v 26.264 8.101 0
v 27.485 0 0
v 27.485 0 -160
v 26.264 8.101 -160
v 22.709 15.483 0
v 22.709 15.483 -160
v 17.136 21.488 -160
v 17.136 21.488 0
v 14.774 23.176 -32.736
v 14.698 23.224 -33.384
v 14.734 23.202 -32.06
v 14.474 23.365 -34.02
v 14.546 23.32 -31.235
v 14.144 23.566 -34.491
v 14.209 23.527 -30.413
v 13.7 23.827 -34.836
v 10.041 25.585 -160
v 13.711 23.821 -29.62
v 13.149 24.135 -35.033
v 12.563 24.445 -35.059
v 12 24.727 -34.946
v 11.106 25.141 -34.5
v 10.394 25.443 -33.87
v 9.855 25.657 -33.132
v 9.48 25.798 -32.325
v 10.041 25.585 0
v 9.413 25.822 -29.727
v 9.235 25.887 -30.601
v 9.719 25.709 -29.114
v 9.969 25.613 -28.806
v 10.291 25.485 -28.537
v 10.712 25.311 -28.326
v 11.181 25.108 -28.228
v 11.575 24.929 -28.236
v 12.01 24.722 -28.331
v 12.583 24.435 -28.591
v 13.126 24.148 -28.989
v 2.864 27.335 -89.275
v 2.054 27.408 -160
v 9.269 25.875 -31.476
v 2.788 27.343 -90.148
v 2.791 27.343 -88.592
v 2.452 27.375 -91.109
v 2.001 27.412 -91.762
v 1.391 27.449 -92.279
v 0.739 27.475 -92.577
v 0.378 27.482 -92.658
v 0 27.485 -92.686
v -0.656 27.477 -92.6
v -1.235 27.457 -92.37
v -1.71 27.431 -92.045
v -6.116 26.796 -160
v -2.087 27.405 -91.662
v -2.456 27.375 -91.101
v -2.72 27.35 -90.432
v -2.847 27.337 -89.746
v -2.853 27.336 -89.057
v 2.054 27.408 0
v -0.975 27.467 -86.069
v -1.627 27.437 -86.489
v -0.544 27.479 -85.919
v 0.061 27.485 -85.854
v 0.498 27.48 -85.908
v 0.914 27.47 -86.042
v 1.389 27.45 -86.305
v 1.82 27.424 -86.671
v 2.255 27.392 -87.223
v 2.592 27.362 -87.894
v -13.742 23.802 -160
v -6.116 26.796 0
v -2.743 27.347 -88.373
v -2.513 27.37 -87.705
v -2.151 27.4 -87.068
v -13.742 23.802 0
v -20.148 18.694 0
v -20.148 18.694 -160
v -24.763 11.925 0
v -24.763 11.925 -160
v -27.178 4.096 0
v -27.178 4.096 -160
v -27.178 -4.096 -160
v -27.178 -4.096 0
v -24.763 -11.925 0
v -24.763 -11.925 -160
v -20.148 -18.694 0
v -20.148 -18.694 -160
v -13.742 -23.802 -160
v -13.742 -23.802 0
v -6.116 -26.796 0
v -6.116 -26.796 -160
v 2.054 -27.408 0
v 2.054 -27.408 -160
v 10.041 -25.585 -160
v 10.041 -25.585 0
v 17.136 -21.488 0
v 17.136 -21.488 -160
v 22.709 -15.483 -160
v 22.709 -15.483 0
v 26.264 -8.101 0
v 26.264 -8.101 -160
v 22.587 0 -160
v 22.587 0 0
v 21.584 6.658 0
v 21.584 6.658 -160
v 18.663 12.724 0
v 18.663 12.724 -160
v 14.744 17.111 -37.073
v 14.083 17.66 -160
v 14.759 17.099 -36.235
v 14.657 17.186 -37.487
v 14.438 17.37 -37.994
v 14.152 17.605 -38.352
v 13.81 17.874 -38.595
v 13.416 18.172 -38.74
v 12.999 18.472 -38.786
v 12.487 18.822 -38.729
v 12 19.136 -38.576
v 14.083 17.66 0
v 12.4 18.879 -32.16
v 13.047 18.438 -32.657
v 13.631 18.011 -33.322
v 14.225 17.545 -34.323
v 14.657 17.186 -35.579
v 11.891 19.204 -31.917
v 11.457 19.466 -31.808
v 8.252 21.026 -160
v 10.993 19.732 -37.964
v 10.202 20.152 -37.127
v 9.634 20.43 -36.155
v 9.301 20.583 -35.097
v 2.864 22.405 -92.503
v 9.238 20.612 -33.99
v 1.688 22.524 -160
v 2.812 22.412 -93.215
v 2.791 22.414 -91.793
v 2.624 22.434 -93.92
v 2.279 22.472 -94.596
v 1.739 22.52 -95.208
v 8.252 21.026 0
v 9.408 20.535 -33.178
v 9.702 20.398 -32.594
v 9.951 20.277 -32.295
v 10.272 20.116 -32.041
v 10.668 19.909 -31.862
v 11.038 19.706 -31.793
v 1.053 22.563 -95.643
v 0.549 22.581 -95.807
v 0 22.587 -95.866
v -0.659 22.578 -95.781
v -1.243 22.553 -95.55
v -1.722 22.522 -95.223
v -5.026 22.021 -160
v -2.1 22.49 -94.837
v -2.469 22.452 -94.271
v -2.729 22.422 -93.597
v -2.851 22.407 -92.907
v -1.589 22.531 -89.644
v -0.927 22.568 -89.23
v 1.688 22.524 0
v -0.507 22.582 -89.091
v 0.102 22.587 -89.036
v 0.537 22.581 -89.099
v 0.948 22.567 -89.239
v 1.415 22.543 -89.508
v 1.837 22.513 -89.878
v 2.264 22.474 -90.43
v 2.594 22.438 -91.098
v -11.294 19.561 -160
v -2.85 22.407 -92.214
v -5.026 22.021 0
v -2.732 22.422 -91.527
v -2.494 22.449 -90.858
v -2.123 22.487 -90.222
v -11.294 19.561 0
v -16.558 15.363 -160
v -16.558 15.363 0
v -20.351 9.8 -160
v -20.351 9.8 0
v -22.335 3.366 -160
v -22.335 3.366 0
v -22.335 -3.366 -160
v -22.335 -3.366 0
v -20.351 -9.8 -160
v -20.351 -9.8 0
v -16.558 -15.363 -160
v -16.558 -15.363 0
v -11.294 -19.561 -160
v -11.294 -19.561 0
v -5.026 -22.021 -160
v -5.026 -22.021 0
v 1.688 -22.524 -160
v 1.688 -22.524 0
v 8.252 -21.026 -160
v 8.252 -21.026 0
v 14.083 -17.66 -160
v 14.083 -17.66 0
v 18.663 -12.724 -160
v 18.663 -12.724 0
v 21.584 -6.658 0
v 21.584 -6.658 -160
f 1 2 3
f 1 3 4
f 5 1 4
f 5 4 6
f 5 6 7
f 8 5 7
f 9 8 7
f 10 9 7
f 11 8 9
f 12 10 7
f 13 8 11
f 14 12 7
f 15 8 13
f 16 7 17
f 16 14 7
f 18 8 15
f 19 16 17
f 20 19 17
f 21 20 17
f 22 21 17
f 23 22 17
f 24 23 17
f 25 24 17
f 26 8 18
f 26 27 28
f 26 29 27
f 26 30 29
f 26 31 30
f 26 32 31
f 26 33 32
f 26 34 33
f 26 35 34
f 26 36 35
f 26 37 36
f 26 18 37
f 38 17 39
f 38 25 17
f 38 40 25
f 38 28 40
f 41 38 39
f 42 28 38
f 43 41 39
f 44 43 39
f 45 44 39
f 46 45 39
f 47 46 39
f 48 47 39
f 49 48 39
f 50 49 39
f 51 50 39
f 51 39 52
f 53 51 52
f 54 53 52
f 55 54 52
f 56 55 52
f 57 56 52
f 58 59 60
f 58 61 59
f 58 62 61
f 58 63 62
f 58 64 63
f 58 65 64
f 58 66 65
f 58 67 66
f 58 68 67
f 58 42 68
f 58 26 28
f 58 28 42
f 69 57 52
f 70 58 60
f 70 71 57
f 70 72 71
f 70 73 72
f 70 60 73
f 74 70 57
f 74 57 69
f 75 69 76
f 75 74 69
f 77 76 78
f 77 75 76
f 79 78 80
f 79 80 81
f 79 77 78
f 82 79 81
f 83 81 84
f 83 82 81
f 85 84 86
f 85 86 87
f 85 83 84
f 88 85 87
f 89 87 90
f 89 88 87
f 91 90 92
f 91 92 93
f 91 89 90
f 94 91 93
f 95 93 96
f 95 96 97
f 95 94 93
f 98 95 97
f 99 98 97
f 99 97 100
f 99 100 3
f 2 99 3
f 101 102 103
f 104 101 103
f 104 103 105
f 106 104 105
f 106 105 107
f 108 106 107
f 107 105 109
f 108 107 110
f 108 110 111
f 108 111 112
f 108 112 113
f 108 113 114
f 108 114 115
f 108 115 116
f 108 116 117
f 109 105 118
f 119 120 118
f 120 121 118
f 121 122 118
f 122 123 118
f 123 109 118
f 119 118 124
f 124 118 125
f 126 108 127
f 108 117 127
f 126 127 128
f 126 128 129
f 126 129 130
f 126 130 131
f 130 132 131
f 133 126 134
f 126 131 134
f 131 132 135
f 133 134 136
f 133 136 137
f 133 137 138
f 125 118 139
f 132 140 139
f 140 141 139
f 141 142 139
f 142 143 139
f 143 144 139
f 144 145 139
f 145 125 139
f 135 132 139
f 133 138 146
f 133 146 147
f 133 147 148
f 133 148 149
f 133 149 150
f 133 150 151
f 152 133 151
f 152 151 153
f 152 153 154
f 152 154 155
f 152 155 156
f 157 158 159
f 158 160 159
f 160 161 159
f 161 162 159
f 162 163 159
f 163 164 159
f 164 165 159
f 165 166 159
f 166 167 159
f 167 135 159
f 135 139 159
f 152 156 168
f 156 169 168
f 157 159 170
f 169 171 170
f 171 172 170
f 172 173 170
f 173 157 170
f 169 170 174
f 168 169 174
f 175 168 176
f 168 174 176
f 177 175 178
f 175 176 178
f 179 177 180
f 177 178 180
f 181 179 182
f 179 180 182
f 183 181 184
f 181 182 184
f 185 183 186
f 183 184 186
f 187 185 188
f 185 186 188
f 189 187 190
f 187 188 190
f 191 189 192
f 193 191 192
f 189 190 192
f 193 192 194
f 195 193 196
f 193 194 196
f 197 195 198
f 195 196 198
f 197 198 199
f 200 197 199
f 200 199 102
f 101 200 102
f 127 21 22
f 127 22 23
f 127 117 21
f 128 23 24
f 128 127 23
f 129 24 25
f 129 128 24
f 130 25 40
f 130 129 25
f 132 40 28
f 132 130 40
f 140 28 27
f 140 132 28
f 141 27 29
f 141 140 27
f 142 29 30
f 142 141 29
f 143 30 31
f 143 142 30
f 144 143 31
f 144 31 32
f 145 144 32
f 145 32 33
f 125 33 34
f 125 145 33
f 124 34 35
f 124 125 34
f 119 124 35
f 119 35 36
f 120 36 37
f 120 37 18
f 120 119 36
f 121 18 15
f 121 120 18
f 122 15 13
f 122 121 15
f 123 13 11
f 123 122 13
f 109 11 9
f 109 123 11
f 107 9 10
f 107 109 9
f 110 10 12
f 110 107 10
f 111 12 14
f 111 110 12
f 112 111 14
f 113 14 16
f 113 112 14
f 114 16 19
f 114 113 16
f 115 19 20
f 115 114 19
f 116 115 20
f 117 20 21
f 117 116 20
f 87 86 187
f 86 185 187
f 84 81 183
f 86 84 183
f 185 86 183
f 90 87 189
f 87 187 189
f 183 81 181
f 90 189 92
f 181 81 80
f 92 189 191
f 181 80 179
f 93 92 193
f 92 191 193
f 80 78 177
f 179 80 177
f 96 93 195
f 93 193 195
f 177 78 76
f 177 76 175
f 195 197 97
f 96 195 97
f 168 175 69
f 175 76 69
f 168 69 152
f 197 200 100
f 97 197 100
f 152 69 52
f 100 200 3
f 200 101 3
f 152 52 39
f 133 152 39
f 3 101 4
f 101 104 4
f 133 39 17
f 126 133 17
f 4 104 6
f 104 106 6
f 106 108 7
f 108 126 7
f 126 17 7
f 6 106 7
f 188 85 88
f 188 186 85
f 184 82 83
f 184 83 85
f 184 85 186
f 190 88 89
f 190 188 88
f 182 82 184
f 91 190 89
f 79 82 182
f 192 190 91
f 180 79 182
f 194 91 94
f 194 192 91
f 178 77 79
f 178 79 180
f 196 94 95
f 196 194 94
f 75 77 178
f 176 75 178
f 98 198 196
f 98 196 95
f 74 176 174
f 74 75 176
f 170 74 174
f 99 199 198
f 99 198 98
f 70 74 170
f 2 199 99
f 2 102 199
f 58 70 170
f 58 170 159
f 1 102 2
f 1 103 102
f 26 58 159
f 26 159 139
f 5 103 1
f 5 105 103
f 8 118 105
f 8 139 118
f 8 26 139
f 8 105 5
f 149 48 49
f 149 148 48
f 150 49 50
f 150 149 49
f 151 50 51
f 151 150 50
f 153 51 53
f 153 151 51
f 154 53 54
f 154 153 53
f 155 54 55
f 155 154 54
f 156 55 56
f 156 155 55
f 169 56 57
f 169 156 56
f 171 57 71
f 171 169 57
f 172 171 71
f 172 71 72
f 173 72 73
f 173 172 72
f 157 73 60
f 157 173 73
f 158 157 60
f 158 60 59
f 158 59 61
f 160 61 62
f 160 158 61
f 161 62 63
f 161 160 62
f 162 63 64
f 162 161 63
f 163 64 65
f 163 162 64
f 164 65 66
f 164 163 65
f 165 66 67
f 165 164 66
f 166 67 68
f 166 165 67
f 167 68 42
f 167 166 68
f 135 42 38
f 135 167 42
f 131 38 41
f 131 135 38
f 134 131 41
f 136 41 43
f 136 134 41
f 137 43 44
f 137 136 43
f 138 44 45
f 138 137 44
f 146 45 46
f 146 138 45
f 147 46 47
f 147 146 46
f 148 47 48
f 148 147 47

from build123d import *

# Parameters (mm, degrees)
SKIZZE1_R                       = 27.484712029
SKIZZE1_R_2                     = 22.58736277
AUFSATZ_LINEAR_AUSTRAGEN1_DEPTH = 160


with BuildPart() as part:
    # Skizze1 → Aufsatz-Linear austragen1 (new body)
    with BuildSketch(Plane.XY):
        Circle(SKIZZE1_R)
        Circle(SKIZZE1_R_2, mode=Mode.SUBTRACT)
    extrude(amount=-AUFSATZ_LINEAR_AUSTRAGEN1_DEPTH)

    # Skizze6 → Ø6.0 (6) Durchmesser Bohrung2 (revolve, cut)
    with BuildSketch(Plane(origin=(0, 0, -107.118504804), x_dir=(0, 0.544639035, -0.838670568), z_dir=(1, 0, 0))):
        Polygon((0, 0), (0, 83.113387119), (2.865, 81.391921446), (2.865, 0), align=None)
    revolve(axis=Axis((0, -5.325558106, -110.576962677), (0, 0.838670568, 0.544639035)), mode=Mode.SUBTRACT)

    # Skizze9 → Ø6.0 (6) Durchmesser Bohrung3 (revolve, cut)
    with BuildSketch(Plane(origin=(12, -1.983133308, -48.982393542), x_dir=(0, 0.544639035, -0.838670568), z_dir=(1, 0, 0))):
        Polygon((0, 0), (0, 53.059309664), (2.775, 51.391921446), (2.775, 0), align=None)
    revolve(axis=Axis((12, -7.308691414, -52.440851414), (0, 0.838670568, 0.544639035)), mode=Mode.SUBTRACT)


solid = part.part
